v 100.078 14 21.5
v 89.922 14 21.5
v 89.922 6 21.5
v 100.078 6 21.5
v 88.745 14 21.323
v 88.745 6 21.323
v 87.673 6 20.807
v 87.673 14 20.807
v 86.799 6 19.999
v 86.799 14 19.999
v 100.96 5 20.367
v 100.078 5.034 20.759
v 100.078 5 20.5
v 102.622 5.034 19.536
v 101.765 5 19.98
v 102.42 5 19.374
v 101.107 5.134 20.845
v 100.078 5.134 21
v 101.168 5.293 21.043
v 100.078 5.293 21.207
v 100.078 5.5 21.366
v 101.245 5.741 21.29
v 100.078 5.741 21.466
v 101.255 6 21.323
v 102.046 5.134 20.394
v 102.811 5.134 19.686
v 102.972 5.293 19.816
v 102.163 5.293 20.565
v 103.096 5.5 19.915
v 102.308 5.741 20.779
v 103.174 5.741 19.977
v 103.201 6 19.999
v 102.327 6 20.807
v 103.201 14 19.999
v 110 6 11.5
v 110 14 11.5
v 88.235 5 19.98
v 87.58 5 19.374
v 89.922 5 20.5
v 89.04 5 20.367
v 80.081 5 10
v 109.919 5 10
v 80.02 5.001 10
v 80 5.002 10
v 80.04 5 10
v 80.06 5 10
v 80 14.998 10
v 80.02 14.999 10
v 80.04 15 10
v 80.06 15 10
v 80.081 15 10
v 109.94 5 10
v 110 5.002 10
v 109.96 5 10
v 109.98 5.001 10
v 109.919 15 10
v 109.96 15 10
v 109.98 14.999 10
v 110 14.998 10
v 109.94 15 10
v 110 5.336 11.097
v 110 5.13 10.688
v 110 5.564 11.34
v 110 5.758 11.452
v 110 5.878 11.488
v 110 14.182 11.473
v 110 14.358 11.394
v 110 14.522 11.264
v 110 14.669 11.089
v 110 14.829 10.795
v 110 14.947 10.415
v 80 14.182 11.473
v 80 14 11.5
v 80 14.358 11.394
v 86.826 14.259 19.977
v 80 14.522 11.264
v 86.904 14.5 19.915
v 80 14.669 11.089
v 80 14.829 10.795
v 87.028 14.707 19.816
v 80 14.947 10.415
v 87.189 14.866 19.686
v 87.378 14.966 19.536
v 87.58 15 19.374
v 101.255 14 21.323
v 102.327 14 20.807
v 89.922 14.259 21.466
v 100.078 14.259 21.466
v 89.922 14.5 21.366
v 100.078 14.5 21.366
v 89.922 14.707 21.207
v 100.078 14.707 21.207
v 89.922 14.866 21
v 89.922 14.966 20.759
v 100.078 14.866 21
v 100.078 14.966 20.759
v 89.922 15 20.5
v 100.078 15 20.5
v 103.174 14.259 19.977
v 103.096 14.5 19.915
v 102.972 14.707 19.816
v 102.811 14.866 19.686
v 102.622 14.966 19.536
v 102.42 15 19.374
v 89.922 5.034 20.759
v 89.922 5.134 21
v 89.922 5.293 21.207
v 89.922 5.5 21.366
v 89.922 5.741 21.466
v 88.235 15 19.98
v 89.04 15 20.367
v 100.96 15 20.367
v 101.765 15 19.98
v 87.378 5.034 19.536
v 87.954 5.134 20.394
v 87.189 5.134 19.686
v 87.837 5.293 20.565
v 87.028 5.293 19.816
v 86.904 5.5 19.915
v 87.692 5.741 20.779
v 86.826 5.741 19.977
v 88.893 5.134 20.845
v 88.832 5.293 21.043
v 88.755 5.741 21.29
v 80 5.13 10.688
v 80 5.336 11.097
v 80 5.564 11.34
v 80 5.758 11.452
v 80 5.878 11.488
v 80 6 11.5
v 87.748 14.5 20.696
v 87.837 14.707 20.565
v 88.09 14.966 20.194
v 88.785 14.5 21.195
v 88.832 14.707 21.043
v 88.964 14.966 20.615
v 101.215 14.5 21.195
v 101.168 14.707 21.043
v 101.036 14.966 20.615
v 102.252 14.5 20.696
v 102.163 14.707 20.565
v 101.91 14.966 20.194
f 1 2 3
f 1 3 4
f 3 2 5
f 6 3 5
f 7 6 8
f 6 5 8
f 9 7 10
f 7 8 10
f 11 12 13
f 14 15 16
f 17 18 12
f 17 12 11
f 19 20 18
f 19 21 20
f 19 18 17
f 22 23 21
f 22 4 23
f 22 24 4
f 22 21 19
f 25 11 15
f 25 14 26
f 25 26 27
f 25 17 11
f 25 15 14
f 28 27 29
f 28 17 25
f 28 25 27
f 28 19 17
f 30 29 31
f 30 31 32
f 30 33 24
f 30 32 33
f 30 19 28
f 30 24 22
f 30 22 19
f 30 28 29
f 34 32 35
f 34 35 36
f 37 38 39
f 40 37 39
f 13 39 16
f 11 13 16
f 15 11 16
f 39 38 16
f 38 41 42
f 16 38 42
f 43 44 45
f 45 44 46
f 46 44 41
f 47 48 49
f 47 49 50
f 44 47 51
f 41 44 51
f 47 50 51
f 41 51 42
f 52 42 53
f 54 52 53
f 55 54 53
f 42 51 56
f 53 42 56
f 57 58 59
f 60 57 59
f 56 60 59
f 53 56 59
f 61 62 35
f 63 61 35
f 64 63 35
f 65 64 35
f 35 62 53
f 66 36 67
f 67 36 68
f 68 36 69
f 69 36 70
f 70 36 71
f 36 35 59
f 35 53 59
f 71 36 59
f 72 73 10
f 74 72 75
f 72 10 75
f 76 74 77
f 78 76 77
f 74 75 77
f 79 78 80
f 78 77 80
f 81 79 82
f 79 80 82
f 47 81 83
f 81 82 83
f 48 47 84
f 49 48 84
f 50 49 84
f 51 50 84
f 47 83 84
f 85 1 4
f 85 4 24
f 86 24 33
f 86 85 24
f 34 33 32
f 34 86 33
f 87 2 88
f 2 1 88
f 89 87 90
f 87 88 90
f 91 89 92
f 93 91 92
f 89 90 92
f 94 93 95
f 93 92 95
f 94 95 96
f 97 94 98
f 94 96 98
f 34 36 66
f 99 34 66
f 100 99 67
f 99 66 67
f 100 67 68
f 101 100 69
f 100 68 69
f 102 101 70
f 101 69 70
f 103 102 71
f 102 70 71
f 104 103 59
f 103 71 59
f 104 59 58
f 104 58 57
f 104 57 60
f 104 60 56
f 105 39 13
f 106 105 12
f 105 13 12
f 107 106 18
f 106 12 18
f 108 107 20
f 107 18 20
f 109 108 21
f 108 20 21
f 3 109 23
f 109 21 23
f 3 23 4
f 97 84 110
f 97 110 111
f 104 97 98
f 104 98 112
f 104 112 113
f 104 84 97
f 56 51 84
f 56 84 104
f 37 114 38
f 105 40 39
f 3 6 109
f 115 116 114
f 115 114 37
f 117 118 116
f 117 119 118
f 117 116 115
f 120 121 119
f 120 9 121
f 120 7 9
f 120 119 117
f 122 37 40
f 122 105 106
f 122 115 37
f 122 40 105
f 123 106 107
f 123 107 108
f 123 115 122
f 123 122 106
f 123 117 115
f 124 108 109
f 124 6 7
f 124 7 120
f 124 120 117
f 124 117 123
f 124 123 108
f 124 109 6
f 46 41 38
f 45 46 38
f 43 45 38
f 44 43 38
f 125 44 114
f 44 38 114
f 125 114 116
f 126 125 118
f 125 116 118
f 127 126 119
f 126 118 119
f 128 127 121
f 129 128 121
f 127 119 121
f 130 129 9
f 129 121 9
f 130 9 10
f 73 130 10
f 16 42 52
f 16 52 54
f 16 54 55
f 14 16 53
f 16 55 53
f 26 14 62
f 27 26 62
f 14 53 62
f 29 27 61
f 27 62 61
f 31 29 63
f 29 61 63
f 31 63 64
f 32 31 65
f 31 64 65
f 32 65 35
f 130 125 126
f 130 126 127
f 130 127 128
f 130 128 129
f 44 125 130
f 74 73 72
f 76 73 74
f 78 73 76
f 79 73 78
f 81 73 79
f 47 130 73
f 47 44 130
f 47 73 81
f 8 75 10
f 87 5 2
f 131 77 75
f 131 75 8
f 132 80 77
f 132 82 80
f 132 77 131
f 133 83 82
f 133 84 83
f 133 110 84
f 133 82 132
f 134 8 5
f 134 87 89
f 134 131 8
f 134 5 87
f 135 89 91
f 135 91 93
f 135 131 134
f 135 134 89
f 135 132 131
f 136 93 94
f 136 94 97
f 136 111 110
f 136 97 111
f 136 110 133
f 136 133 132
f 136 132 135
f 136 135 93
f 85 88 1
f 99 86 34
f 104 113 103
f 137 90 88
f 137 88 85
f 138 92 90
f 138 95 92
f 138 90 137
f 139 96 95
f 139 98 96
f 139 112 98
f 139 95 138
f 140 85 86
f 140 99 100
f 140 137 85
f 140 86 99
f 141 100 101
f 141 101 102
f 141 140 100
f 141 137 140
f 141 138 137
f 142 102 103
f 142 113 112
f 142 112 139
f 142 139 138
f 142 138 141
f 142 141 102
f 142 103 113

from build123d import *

# Parameters (mm, degrees)
BOX023_W             = 30
BOX023_H             = 10
BOX023_DEPTH         = 11.5
CHAMFER019_1_SIZE2   = 8
CHAMFER019_1_SIZE    = 10
CHAMFER019_2_SIZE2   = 8
CHAMFER019_2_SIZE    = 10
FILLET002008005015_R = 4
FILLET002008005016_R = 1


with BuildPart() as part:
    # Box023 → Box023 (new body)
    with BuildSketch(Plane(origin=(80, 5, 3), x_dir=(1, 0, 0), z_dir=(0, 0, 1))):
        with Locations((15, 5)):
            Rectangle(BOX023_W, BOX023_H)
    extrude(amount=BOX023_DEPTH)

    # Chamfer019 1
    chamfer019_1_edges = [part.edges().sort_by_distance(p)[0] for p in [
        (110, 10, 14.5),
    ]]
    chamfer019_1_side = part.faces().sort_by_distance((110, 10, 8.75))[0]
    chamfer(chamfer019_1_edges, length=CHAMFER019_1_SIZE, length2=CHAMFER019_1_SIZE2, reference=chamfer019_1_side)

    # Chamfer019 2
    chamfer019_2_edges = [part.edges().sort_by_distance(p)[0] for p in [
        (80, 10, 14.5),
    ]]
    chamfer019_2_side = part.faces().sort_by_distance((80, 10, 8.75))[0]
    chamfer(chamfer019_2_edges, length=CHAMFER019_2_SIZE, length2=CHAMFER019_2_SIZE2, reference=chamfer019_2_side)

    # Fillet002008005015
    fillet002008005015_edges = [part.edges().sort_by_distance(p)[0] for p in [
        (88, 10, 14.5),
        (102, 10, 14.5),
    ]]
    fillet(fillet002008005015_edges, radius=FILLET002008005015_R)

    # Fillet002008005016
    fillet002008005016_edges = [part.edges().sort_by_distance(p)[0] for p in [
        (83.399512, 5, 8.74939),
        (88.189744, 5, 14.105213),
        (95, 5, 14.5),
        (101.810256, 5, 14.105213),
        (106.600488, 5, 8.74939),
        (83.399512, 15, 8.74939),
        (88.189744, 15, 14.105213),
        (95, 15, 14.5),
        (101.810256, 15, 14.105213),
        (106.600488, 15, 8.74939),
    ]]
    fillet(fillet002008005016_edges, radius=FILLET002008005016_R)


with BuildPart() as part_1:
    # Fillet002008005016 placement: moved
    add(part.part.moved(Location((0, 0, 7))))


solid = part_1.part
